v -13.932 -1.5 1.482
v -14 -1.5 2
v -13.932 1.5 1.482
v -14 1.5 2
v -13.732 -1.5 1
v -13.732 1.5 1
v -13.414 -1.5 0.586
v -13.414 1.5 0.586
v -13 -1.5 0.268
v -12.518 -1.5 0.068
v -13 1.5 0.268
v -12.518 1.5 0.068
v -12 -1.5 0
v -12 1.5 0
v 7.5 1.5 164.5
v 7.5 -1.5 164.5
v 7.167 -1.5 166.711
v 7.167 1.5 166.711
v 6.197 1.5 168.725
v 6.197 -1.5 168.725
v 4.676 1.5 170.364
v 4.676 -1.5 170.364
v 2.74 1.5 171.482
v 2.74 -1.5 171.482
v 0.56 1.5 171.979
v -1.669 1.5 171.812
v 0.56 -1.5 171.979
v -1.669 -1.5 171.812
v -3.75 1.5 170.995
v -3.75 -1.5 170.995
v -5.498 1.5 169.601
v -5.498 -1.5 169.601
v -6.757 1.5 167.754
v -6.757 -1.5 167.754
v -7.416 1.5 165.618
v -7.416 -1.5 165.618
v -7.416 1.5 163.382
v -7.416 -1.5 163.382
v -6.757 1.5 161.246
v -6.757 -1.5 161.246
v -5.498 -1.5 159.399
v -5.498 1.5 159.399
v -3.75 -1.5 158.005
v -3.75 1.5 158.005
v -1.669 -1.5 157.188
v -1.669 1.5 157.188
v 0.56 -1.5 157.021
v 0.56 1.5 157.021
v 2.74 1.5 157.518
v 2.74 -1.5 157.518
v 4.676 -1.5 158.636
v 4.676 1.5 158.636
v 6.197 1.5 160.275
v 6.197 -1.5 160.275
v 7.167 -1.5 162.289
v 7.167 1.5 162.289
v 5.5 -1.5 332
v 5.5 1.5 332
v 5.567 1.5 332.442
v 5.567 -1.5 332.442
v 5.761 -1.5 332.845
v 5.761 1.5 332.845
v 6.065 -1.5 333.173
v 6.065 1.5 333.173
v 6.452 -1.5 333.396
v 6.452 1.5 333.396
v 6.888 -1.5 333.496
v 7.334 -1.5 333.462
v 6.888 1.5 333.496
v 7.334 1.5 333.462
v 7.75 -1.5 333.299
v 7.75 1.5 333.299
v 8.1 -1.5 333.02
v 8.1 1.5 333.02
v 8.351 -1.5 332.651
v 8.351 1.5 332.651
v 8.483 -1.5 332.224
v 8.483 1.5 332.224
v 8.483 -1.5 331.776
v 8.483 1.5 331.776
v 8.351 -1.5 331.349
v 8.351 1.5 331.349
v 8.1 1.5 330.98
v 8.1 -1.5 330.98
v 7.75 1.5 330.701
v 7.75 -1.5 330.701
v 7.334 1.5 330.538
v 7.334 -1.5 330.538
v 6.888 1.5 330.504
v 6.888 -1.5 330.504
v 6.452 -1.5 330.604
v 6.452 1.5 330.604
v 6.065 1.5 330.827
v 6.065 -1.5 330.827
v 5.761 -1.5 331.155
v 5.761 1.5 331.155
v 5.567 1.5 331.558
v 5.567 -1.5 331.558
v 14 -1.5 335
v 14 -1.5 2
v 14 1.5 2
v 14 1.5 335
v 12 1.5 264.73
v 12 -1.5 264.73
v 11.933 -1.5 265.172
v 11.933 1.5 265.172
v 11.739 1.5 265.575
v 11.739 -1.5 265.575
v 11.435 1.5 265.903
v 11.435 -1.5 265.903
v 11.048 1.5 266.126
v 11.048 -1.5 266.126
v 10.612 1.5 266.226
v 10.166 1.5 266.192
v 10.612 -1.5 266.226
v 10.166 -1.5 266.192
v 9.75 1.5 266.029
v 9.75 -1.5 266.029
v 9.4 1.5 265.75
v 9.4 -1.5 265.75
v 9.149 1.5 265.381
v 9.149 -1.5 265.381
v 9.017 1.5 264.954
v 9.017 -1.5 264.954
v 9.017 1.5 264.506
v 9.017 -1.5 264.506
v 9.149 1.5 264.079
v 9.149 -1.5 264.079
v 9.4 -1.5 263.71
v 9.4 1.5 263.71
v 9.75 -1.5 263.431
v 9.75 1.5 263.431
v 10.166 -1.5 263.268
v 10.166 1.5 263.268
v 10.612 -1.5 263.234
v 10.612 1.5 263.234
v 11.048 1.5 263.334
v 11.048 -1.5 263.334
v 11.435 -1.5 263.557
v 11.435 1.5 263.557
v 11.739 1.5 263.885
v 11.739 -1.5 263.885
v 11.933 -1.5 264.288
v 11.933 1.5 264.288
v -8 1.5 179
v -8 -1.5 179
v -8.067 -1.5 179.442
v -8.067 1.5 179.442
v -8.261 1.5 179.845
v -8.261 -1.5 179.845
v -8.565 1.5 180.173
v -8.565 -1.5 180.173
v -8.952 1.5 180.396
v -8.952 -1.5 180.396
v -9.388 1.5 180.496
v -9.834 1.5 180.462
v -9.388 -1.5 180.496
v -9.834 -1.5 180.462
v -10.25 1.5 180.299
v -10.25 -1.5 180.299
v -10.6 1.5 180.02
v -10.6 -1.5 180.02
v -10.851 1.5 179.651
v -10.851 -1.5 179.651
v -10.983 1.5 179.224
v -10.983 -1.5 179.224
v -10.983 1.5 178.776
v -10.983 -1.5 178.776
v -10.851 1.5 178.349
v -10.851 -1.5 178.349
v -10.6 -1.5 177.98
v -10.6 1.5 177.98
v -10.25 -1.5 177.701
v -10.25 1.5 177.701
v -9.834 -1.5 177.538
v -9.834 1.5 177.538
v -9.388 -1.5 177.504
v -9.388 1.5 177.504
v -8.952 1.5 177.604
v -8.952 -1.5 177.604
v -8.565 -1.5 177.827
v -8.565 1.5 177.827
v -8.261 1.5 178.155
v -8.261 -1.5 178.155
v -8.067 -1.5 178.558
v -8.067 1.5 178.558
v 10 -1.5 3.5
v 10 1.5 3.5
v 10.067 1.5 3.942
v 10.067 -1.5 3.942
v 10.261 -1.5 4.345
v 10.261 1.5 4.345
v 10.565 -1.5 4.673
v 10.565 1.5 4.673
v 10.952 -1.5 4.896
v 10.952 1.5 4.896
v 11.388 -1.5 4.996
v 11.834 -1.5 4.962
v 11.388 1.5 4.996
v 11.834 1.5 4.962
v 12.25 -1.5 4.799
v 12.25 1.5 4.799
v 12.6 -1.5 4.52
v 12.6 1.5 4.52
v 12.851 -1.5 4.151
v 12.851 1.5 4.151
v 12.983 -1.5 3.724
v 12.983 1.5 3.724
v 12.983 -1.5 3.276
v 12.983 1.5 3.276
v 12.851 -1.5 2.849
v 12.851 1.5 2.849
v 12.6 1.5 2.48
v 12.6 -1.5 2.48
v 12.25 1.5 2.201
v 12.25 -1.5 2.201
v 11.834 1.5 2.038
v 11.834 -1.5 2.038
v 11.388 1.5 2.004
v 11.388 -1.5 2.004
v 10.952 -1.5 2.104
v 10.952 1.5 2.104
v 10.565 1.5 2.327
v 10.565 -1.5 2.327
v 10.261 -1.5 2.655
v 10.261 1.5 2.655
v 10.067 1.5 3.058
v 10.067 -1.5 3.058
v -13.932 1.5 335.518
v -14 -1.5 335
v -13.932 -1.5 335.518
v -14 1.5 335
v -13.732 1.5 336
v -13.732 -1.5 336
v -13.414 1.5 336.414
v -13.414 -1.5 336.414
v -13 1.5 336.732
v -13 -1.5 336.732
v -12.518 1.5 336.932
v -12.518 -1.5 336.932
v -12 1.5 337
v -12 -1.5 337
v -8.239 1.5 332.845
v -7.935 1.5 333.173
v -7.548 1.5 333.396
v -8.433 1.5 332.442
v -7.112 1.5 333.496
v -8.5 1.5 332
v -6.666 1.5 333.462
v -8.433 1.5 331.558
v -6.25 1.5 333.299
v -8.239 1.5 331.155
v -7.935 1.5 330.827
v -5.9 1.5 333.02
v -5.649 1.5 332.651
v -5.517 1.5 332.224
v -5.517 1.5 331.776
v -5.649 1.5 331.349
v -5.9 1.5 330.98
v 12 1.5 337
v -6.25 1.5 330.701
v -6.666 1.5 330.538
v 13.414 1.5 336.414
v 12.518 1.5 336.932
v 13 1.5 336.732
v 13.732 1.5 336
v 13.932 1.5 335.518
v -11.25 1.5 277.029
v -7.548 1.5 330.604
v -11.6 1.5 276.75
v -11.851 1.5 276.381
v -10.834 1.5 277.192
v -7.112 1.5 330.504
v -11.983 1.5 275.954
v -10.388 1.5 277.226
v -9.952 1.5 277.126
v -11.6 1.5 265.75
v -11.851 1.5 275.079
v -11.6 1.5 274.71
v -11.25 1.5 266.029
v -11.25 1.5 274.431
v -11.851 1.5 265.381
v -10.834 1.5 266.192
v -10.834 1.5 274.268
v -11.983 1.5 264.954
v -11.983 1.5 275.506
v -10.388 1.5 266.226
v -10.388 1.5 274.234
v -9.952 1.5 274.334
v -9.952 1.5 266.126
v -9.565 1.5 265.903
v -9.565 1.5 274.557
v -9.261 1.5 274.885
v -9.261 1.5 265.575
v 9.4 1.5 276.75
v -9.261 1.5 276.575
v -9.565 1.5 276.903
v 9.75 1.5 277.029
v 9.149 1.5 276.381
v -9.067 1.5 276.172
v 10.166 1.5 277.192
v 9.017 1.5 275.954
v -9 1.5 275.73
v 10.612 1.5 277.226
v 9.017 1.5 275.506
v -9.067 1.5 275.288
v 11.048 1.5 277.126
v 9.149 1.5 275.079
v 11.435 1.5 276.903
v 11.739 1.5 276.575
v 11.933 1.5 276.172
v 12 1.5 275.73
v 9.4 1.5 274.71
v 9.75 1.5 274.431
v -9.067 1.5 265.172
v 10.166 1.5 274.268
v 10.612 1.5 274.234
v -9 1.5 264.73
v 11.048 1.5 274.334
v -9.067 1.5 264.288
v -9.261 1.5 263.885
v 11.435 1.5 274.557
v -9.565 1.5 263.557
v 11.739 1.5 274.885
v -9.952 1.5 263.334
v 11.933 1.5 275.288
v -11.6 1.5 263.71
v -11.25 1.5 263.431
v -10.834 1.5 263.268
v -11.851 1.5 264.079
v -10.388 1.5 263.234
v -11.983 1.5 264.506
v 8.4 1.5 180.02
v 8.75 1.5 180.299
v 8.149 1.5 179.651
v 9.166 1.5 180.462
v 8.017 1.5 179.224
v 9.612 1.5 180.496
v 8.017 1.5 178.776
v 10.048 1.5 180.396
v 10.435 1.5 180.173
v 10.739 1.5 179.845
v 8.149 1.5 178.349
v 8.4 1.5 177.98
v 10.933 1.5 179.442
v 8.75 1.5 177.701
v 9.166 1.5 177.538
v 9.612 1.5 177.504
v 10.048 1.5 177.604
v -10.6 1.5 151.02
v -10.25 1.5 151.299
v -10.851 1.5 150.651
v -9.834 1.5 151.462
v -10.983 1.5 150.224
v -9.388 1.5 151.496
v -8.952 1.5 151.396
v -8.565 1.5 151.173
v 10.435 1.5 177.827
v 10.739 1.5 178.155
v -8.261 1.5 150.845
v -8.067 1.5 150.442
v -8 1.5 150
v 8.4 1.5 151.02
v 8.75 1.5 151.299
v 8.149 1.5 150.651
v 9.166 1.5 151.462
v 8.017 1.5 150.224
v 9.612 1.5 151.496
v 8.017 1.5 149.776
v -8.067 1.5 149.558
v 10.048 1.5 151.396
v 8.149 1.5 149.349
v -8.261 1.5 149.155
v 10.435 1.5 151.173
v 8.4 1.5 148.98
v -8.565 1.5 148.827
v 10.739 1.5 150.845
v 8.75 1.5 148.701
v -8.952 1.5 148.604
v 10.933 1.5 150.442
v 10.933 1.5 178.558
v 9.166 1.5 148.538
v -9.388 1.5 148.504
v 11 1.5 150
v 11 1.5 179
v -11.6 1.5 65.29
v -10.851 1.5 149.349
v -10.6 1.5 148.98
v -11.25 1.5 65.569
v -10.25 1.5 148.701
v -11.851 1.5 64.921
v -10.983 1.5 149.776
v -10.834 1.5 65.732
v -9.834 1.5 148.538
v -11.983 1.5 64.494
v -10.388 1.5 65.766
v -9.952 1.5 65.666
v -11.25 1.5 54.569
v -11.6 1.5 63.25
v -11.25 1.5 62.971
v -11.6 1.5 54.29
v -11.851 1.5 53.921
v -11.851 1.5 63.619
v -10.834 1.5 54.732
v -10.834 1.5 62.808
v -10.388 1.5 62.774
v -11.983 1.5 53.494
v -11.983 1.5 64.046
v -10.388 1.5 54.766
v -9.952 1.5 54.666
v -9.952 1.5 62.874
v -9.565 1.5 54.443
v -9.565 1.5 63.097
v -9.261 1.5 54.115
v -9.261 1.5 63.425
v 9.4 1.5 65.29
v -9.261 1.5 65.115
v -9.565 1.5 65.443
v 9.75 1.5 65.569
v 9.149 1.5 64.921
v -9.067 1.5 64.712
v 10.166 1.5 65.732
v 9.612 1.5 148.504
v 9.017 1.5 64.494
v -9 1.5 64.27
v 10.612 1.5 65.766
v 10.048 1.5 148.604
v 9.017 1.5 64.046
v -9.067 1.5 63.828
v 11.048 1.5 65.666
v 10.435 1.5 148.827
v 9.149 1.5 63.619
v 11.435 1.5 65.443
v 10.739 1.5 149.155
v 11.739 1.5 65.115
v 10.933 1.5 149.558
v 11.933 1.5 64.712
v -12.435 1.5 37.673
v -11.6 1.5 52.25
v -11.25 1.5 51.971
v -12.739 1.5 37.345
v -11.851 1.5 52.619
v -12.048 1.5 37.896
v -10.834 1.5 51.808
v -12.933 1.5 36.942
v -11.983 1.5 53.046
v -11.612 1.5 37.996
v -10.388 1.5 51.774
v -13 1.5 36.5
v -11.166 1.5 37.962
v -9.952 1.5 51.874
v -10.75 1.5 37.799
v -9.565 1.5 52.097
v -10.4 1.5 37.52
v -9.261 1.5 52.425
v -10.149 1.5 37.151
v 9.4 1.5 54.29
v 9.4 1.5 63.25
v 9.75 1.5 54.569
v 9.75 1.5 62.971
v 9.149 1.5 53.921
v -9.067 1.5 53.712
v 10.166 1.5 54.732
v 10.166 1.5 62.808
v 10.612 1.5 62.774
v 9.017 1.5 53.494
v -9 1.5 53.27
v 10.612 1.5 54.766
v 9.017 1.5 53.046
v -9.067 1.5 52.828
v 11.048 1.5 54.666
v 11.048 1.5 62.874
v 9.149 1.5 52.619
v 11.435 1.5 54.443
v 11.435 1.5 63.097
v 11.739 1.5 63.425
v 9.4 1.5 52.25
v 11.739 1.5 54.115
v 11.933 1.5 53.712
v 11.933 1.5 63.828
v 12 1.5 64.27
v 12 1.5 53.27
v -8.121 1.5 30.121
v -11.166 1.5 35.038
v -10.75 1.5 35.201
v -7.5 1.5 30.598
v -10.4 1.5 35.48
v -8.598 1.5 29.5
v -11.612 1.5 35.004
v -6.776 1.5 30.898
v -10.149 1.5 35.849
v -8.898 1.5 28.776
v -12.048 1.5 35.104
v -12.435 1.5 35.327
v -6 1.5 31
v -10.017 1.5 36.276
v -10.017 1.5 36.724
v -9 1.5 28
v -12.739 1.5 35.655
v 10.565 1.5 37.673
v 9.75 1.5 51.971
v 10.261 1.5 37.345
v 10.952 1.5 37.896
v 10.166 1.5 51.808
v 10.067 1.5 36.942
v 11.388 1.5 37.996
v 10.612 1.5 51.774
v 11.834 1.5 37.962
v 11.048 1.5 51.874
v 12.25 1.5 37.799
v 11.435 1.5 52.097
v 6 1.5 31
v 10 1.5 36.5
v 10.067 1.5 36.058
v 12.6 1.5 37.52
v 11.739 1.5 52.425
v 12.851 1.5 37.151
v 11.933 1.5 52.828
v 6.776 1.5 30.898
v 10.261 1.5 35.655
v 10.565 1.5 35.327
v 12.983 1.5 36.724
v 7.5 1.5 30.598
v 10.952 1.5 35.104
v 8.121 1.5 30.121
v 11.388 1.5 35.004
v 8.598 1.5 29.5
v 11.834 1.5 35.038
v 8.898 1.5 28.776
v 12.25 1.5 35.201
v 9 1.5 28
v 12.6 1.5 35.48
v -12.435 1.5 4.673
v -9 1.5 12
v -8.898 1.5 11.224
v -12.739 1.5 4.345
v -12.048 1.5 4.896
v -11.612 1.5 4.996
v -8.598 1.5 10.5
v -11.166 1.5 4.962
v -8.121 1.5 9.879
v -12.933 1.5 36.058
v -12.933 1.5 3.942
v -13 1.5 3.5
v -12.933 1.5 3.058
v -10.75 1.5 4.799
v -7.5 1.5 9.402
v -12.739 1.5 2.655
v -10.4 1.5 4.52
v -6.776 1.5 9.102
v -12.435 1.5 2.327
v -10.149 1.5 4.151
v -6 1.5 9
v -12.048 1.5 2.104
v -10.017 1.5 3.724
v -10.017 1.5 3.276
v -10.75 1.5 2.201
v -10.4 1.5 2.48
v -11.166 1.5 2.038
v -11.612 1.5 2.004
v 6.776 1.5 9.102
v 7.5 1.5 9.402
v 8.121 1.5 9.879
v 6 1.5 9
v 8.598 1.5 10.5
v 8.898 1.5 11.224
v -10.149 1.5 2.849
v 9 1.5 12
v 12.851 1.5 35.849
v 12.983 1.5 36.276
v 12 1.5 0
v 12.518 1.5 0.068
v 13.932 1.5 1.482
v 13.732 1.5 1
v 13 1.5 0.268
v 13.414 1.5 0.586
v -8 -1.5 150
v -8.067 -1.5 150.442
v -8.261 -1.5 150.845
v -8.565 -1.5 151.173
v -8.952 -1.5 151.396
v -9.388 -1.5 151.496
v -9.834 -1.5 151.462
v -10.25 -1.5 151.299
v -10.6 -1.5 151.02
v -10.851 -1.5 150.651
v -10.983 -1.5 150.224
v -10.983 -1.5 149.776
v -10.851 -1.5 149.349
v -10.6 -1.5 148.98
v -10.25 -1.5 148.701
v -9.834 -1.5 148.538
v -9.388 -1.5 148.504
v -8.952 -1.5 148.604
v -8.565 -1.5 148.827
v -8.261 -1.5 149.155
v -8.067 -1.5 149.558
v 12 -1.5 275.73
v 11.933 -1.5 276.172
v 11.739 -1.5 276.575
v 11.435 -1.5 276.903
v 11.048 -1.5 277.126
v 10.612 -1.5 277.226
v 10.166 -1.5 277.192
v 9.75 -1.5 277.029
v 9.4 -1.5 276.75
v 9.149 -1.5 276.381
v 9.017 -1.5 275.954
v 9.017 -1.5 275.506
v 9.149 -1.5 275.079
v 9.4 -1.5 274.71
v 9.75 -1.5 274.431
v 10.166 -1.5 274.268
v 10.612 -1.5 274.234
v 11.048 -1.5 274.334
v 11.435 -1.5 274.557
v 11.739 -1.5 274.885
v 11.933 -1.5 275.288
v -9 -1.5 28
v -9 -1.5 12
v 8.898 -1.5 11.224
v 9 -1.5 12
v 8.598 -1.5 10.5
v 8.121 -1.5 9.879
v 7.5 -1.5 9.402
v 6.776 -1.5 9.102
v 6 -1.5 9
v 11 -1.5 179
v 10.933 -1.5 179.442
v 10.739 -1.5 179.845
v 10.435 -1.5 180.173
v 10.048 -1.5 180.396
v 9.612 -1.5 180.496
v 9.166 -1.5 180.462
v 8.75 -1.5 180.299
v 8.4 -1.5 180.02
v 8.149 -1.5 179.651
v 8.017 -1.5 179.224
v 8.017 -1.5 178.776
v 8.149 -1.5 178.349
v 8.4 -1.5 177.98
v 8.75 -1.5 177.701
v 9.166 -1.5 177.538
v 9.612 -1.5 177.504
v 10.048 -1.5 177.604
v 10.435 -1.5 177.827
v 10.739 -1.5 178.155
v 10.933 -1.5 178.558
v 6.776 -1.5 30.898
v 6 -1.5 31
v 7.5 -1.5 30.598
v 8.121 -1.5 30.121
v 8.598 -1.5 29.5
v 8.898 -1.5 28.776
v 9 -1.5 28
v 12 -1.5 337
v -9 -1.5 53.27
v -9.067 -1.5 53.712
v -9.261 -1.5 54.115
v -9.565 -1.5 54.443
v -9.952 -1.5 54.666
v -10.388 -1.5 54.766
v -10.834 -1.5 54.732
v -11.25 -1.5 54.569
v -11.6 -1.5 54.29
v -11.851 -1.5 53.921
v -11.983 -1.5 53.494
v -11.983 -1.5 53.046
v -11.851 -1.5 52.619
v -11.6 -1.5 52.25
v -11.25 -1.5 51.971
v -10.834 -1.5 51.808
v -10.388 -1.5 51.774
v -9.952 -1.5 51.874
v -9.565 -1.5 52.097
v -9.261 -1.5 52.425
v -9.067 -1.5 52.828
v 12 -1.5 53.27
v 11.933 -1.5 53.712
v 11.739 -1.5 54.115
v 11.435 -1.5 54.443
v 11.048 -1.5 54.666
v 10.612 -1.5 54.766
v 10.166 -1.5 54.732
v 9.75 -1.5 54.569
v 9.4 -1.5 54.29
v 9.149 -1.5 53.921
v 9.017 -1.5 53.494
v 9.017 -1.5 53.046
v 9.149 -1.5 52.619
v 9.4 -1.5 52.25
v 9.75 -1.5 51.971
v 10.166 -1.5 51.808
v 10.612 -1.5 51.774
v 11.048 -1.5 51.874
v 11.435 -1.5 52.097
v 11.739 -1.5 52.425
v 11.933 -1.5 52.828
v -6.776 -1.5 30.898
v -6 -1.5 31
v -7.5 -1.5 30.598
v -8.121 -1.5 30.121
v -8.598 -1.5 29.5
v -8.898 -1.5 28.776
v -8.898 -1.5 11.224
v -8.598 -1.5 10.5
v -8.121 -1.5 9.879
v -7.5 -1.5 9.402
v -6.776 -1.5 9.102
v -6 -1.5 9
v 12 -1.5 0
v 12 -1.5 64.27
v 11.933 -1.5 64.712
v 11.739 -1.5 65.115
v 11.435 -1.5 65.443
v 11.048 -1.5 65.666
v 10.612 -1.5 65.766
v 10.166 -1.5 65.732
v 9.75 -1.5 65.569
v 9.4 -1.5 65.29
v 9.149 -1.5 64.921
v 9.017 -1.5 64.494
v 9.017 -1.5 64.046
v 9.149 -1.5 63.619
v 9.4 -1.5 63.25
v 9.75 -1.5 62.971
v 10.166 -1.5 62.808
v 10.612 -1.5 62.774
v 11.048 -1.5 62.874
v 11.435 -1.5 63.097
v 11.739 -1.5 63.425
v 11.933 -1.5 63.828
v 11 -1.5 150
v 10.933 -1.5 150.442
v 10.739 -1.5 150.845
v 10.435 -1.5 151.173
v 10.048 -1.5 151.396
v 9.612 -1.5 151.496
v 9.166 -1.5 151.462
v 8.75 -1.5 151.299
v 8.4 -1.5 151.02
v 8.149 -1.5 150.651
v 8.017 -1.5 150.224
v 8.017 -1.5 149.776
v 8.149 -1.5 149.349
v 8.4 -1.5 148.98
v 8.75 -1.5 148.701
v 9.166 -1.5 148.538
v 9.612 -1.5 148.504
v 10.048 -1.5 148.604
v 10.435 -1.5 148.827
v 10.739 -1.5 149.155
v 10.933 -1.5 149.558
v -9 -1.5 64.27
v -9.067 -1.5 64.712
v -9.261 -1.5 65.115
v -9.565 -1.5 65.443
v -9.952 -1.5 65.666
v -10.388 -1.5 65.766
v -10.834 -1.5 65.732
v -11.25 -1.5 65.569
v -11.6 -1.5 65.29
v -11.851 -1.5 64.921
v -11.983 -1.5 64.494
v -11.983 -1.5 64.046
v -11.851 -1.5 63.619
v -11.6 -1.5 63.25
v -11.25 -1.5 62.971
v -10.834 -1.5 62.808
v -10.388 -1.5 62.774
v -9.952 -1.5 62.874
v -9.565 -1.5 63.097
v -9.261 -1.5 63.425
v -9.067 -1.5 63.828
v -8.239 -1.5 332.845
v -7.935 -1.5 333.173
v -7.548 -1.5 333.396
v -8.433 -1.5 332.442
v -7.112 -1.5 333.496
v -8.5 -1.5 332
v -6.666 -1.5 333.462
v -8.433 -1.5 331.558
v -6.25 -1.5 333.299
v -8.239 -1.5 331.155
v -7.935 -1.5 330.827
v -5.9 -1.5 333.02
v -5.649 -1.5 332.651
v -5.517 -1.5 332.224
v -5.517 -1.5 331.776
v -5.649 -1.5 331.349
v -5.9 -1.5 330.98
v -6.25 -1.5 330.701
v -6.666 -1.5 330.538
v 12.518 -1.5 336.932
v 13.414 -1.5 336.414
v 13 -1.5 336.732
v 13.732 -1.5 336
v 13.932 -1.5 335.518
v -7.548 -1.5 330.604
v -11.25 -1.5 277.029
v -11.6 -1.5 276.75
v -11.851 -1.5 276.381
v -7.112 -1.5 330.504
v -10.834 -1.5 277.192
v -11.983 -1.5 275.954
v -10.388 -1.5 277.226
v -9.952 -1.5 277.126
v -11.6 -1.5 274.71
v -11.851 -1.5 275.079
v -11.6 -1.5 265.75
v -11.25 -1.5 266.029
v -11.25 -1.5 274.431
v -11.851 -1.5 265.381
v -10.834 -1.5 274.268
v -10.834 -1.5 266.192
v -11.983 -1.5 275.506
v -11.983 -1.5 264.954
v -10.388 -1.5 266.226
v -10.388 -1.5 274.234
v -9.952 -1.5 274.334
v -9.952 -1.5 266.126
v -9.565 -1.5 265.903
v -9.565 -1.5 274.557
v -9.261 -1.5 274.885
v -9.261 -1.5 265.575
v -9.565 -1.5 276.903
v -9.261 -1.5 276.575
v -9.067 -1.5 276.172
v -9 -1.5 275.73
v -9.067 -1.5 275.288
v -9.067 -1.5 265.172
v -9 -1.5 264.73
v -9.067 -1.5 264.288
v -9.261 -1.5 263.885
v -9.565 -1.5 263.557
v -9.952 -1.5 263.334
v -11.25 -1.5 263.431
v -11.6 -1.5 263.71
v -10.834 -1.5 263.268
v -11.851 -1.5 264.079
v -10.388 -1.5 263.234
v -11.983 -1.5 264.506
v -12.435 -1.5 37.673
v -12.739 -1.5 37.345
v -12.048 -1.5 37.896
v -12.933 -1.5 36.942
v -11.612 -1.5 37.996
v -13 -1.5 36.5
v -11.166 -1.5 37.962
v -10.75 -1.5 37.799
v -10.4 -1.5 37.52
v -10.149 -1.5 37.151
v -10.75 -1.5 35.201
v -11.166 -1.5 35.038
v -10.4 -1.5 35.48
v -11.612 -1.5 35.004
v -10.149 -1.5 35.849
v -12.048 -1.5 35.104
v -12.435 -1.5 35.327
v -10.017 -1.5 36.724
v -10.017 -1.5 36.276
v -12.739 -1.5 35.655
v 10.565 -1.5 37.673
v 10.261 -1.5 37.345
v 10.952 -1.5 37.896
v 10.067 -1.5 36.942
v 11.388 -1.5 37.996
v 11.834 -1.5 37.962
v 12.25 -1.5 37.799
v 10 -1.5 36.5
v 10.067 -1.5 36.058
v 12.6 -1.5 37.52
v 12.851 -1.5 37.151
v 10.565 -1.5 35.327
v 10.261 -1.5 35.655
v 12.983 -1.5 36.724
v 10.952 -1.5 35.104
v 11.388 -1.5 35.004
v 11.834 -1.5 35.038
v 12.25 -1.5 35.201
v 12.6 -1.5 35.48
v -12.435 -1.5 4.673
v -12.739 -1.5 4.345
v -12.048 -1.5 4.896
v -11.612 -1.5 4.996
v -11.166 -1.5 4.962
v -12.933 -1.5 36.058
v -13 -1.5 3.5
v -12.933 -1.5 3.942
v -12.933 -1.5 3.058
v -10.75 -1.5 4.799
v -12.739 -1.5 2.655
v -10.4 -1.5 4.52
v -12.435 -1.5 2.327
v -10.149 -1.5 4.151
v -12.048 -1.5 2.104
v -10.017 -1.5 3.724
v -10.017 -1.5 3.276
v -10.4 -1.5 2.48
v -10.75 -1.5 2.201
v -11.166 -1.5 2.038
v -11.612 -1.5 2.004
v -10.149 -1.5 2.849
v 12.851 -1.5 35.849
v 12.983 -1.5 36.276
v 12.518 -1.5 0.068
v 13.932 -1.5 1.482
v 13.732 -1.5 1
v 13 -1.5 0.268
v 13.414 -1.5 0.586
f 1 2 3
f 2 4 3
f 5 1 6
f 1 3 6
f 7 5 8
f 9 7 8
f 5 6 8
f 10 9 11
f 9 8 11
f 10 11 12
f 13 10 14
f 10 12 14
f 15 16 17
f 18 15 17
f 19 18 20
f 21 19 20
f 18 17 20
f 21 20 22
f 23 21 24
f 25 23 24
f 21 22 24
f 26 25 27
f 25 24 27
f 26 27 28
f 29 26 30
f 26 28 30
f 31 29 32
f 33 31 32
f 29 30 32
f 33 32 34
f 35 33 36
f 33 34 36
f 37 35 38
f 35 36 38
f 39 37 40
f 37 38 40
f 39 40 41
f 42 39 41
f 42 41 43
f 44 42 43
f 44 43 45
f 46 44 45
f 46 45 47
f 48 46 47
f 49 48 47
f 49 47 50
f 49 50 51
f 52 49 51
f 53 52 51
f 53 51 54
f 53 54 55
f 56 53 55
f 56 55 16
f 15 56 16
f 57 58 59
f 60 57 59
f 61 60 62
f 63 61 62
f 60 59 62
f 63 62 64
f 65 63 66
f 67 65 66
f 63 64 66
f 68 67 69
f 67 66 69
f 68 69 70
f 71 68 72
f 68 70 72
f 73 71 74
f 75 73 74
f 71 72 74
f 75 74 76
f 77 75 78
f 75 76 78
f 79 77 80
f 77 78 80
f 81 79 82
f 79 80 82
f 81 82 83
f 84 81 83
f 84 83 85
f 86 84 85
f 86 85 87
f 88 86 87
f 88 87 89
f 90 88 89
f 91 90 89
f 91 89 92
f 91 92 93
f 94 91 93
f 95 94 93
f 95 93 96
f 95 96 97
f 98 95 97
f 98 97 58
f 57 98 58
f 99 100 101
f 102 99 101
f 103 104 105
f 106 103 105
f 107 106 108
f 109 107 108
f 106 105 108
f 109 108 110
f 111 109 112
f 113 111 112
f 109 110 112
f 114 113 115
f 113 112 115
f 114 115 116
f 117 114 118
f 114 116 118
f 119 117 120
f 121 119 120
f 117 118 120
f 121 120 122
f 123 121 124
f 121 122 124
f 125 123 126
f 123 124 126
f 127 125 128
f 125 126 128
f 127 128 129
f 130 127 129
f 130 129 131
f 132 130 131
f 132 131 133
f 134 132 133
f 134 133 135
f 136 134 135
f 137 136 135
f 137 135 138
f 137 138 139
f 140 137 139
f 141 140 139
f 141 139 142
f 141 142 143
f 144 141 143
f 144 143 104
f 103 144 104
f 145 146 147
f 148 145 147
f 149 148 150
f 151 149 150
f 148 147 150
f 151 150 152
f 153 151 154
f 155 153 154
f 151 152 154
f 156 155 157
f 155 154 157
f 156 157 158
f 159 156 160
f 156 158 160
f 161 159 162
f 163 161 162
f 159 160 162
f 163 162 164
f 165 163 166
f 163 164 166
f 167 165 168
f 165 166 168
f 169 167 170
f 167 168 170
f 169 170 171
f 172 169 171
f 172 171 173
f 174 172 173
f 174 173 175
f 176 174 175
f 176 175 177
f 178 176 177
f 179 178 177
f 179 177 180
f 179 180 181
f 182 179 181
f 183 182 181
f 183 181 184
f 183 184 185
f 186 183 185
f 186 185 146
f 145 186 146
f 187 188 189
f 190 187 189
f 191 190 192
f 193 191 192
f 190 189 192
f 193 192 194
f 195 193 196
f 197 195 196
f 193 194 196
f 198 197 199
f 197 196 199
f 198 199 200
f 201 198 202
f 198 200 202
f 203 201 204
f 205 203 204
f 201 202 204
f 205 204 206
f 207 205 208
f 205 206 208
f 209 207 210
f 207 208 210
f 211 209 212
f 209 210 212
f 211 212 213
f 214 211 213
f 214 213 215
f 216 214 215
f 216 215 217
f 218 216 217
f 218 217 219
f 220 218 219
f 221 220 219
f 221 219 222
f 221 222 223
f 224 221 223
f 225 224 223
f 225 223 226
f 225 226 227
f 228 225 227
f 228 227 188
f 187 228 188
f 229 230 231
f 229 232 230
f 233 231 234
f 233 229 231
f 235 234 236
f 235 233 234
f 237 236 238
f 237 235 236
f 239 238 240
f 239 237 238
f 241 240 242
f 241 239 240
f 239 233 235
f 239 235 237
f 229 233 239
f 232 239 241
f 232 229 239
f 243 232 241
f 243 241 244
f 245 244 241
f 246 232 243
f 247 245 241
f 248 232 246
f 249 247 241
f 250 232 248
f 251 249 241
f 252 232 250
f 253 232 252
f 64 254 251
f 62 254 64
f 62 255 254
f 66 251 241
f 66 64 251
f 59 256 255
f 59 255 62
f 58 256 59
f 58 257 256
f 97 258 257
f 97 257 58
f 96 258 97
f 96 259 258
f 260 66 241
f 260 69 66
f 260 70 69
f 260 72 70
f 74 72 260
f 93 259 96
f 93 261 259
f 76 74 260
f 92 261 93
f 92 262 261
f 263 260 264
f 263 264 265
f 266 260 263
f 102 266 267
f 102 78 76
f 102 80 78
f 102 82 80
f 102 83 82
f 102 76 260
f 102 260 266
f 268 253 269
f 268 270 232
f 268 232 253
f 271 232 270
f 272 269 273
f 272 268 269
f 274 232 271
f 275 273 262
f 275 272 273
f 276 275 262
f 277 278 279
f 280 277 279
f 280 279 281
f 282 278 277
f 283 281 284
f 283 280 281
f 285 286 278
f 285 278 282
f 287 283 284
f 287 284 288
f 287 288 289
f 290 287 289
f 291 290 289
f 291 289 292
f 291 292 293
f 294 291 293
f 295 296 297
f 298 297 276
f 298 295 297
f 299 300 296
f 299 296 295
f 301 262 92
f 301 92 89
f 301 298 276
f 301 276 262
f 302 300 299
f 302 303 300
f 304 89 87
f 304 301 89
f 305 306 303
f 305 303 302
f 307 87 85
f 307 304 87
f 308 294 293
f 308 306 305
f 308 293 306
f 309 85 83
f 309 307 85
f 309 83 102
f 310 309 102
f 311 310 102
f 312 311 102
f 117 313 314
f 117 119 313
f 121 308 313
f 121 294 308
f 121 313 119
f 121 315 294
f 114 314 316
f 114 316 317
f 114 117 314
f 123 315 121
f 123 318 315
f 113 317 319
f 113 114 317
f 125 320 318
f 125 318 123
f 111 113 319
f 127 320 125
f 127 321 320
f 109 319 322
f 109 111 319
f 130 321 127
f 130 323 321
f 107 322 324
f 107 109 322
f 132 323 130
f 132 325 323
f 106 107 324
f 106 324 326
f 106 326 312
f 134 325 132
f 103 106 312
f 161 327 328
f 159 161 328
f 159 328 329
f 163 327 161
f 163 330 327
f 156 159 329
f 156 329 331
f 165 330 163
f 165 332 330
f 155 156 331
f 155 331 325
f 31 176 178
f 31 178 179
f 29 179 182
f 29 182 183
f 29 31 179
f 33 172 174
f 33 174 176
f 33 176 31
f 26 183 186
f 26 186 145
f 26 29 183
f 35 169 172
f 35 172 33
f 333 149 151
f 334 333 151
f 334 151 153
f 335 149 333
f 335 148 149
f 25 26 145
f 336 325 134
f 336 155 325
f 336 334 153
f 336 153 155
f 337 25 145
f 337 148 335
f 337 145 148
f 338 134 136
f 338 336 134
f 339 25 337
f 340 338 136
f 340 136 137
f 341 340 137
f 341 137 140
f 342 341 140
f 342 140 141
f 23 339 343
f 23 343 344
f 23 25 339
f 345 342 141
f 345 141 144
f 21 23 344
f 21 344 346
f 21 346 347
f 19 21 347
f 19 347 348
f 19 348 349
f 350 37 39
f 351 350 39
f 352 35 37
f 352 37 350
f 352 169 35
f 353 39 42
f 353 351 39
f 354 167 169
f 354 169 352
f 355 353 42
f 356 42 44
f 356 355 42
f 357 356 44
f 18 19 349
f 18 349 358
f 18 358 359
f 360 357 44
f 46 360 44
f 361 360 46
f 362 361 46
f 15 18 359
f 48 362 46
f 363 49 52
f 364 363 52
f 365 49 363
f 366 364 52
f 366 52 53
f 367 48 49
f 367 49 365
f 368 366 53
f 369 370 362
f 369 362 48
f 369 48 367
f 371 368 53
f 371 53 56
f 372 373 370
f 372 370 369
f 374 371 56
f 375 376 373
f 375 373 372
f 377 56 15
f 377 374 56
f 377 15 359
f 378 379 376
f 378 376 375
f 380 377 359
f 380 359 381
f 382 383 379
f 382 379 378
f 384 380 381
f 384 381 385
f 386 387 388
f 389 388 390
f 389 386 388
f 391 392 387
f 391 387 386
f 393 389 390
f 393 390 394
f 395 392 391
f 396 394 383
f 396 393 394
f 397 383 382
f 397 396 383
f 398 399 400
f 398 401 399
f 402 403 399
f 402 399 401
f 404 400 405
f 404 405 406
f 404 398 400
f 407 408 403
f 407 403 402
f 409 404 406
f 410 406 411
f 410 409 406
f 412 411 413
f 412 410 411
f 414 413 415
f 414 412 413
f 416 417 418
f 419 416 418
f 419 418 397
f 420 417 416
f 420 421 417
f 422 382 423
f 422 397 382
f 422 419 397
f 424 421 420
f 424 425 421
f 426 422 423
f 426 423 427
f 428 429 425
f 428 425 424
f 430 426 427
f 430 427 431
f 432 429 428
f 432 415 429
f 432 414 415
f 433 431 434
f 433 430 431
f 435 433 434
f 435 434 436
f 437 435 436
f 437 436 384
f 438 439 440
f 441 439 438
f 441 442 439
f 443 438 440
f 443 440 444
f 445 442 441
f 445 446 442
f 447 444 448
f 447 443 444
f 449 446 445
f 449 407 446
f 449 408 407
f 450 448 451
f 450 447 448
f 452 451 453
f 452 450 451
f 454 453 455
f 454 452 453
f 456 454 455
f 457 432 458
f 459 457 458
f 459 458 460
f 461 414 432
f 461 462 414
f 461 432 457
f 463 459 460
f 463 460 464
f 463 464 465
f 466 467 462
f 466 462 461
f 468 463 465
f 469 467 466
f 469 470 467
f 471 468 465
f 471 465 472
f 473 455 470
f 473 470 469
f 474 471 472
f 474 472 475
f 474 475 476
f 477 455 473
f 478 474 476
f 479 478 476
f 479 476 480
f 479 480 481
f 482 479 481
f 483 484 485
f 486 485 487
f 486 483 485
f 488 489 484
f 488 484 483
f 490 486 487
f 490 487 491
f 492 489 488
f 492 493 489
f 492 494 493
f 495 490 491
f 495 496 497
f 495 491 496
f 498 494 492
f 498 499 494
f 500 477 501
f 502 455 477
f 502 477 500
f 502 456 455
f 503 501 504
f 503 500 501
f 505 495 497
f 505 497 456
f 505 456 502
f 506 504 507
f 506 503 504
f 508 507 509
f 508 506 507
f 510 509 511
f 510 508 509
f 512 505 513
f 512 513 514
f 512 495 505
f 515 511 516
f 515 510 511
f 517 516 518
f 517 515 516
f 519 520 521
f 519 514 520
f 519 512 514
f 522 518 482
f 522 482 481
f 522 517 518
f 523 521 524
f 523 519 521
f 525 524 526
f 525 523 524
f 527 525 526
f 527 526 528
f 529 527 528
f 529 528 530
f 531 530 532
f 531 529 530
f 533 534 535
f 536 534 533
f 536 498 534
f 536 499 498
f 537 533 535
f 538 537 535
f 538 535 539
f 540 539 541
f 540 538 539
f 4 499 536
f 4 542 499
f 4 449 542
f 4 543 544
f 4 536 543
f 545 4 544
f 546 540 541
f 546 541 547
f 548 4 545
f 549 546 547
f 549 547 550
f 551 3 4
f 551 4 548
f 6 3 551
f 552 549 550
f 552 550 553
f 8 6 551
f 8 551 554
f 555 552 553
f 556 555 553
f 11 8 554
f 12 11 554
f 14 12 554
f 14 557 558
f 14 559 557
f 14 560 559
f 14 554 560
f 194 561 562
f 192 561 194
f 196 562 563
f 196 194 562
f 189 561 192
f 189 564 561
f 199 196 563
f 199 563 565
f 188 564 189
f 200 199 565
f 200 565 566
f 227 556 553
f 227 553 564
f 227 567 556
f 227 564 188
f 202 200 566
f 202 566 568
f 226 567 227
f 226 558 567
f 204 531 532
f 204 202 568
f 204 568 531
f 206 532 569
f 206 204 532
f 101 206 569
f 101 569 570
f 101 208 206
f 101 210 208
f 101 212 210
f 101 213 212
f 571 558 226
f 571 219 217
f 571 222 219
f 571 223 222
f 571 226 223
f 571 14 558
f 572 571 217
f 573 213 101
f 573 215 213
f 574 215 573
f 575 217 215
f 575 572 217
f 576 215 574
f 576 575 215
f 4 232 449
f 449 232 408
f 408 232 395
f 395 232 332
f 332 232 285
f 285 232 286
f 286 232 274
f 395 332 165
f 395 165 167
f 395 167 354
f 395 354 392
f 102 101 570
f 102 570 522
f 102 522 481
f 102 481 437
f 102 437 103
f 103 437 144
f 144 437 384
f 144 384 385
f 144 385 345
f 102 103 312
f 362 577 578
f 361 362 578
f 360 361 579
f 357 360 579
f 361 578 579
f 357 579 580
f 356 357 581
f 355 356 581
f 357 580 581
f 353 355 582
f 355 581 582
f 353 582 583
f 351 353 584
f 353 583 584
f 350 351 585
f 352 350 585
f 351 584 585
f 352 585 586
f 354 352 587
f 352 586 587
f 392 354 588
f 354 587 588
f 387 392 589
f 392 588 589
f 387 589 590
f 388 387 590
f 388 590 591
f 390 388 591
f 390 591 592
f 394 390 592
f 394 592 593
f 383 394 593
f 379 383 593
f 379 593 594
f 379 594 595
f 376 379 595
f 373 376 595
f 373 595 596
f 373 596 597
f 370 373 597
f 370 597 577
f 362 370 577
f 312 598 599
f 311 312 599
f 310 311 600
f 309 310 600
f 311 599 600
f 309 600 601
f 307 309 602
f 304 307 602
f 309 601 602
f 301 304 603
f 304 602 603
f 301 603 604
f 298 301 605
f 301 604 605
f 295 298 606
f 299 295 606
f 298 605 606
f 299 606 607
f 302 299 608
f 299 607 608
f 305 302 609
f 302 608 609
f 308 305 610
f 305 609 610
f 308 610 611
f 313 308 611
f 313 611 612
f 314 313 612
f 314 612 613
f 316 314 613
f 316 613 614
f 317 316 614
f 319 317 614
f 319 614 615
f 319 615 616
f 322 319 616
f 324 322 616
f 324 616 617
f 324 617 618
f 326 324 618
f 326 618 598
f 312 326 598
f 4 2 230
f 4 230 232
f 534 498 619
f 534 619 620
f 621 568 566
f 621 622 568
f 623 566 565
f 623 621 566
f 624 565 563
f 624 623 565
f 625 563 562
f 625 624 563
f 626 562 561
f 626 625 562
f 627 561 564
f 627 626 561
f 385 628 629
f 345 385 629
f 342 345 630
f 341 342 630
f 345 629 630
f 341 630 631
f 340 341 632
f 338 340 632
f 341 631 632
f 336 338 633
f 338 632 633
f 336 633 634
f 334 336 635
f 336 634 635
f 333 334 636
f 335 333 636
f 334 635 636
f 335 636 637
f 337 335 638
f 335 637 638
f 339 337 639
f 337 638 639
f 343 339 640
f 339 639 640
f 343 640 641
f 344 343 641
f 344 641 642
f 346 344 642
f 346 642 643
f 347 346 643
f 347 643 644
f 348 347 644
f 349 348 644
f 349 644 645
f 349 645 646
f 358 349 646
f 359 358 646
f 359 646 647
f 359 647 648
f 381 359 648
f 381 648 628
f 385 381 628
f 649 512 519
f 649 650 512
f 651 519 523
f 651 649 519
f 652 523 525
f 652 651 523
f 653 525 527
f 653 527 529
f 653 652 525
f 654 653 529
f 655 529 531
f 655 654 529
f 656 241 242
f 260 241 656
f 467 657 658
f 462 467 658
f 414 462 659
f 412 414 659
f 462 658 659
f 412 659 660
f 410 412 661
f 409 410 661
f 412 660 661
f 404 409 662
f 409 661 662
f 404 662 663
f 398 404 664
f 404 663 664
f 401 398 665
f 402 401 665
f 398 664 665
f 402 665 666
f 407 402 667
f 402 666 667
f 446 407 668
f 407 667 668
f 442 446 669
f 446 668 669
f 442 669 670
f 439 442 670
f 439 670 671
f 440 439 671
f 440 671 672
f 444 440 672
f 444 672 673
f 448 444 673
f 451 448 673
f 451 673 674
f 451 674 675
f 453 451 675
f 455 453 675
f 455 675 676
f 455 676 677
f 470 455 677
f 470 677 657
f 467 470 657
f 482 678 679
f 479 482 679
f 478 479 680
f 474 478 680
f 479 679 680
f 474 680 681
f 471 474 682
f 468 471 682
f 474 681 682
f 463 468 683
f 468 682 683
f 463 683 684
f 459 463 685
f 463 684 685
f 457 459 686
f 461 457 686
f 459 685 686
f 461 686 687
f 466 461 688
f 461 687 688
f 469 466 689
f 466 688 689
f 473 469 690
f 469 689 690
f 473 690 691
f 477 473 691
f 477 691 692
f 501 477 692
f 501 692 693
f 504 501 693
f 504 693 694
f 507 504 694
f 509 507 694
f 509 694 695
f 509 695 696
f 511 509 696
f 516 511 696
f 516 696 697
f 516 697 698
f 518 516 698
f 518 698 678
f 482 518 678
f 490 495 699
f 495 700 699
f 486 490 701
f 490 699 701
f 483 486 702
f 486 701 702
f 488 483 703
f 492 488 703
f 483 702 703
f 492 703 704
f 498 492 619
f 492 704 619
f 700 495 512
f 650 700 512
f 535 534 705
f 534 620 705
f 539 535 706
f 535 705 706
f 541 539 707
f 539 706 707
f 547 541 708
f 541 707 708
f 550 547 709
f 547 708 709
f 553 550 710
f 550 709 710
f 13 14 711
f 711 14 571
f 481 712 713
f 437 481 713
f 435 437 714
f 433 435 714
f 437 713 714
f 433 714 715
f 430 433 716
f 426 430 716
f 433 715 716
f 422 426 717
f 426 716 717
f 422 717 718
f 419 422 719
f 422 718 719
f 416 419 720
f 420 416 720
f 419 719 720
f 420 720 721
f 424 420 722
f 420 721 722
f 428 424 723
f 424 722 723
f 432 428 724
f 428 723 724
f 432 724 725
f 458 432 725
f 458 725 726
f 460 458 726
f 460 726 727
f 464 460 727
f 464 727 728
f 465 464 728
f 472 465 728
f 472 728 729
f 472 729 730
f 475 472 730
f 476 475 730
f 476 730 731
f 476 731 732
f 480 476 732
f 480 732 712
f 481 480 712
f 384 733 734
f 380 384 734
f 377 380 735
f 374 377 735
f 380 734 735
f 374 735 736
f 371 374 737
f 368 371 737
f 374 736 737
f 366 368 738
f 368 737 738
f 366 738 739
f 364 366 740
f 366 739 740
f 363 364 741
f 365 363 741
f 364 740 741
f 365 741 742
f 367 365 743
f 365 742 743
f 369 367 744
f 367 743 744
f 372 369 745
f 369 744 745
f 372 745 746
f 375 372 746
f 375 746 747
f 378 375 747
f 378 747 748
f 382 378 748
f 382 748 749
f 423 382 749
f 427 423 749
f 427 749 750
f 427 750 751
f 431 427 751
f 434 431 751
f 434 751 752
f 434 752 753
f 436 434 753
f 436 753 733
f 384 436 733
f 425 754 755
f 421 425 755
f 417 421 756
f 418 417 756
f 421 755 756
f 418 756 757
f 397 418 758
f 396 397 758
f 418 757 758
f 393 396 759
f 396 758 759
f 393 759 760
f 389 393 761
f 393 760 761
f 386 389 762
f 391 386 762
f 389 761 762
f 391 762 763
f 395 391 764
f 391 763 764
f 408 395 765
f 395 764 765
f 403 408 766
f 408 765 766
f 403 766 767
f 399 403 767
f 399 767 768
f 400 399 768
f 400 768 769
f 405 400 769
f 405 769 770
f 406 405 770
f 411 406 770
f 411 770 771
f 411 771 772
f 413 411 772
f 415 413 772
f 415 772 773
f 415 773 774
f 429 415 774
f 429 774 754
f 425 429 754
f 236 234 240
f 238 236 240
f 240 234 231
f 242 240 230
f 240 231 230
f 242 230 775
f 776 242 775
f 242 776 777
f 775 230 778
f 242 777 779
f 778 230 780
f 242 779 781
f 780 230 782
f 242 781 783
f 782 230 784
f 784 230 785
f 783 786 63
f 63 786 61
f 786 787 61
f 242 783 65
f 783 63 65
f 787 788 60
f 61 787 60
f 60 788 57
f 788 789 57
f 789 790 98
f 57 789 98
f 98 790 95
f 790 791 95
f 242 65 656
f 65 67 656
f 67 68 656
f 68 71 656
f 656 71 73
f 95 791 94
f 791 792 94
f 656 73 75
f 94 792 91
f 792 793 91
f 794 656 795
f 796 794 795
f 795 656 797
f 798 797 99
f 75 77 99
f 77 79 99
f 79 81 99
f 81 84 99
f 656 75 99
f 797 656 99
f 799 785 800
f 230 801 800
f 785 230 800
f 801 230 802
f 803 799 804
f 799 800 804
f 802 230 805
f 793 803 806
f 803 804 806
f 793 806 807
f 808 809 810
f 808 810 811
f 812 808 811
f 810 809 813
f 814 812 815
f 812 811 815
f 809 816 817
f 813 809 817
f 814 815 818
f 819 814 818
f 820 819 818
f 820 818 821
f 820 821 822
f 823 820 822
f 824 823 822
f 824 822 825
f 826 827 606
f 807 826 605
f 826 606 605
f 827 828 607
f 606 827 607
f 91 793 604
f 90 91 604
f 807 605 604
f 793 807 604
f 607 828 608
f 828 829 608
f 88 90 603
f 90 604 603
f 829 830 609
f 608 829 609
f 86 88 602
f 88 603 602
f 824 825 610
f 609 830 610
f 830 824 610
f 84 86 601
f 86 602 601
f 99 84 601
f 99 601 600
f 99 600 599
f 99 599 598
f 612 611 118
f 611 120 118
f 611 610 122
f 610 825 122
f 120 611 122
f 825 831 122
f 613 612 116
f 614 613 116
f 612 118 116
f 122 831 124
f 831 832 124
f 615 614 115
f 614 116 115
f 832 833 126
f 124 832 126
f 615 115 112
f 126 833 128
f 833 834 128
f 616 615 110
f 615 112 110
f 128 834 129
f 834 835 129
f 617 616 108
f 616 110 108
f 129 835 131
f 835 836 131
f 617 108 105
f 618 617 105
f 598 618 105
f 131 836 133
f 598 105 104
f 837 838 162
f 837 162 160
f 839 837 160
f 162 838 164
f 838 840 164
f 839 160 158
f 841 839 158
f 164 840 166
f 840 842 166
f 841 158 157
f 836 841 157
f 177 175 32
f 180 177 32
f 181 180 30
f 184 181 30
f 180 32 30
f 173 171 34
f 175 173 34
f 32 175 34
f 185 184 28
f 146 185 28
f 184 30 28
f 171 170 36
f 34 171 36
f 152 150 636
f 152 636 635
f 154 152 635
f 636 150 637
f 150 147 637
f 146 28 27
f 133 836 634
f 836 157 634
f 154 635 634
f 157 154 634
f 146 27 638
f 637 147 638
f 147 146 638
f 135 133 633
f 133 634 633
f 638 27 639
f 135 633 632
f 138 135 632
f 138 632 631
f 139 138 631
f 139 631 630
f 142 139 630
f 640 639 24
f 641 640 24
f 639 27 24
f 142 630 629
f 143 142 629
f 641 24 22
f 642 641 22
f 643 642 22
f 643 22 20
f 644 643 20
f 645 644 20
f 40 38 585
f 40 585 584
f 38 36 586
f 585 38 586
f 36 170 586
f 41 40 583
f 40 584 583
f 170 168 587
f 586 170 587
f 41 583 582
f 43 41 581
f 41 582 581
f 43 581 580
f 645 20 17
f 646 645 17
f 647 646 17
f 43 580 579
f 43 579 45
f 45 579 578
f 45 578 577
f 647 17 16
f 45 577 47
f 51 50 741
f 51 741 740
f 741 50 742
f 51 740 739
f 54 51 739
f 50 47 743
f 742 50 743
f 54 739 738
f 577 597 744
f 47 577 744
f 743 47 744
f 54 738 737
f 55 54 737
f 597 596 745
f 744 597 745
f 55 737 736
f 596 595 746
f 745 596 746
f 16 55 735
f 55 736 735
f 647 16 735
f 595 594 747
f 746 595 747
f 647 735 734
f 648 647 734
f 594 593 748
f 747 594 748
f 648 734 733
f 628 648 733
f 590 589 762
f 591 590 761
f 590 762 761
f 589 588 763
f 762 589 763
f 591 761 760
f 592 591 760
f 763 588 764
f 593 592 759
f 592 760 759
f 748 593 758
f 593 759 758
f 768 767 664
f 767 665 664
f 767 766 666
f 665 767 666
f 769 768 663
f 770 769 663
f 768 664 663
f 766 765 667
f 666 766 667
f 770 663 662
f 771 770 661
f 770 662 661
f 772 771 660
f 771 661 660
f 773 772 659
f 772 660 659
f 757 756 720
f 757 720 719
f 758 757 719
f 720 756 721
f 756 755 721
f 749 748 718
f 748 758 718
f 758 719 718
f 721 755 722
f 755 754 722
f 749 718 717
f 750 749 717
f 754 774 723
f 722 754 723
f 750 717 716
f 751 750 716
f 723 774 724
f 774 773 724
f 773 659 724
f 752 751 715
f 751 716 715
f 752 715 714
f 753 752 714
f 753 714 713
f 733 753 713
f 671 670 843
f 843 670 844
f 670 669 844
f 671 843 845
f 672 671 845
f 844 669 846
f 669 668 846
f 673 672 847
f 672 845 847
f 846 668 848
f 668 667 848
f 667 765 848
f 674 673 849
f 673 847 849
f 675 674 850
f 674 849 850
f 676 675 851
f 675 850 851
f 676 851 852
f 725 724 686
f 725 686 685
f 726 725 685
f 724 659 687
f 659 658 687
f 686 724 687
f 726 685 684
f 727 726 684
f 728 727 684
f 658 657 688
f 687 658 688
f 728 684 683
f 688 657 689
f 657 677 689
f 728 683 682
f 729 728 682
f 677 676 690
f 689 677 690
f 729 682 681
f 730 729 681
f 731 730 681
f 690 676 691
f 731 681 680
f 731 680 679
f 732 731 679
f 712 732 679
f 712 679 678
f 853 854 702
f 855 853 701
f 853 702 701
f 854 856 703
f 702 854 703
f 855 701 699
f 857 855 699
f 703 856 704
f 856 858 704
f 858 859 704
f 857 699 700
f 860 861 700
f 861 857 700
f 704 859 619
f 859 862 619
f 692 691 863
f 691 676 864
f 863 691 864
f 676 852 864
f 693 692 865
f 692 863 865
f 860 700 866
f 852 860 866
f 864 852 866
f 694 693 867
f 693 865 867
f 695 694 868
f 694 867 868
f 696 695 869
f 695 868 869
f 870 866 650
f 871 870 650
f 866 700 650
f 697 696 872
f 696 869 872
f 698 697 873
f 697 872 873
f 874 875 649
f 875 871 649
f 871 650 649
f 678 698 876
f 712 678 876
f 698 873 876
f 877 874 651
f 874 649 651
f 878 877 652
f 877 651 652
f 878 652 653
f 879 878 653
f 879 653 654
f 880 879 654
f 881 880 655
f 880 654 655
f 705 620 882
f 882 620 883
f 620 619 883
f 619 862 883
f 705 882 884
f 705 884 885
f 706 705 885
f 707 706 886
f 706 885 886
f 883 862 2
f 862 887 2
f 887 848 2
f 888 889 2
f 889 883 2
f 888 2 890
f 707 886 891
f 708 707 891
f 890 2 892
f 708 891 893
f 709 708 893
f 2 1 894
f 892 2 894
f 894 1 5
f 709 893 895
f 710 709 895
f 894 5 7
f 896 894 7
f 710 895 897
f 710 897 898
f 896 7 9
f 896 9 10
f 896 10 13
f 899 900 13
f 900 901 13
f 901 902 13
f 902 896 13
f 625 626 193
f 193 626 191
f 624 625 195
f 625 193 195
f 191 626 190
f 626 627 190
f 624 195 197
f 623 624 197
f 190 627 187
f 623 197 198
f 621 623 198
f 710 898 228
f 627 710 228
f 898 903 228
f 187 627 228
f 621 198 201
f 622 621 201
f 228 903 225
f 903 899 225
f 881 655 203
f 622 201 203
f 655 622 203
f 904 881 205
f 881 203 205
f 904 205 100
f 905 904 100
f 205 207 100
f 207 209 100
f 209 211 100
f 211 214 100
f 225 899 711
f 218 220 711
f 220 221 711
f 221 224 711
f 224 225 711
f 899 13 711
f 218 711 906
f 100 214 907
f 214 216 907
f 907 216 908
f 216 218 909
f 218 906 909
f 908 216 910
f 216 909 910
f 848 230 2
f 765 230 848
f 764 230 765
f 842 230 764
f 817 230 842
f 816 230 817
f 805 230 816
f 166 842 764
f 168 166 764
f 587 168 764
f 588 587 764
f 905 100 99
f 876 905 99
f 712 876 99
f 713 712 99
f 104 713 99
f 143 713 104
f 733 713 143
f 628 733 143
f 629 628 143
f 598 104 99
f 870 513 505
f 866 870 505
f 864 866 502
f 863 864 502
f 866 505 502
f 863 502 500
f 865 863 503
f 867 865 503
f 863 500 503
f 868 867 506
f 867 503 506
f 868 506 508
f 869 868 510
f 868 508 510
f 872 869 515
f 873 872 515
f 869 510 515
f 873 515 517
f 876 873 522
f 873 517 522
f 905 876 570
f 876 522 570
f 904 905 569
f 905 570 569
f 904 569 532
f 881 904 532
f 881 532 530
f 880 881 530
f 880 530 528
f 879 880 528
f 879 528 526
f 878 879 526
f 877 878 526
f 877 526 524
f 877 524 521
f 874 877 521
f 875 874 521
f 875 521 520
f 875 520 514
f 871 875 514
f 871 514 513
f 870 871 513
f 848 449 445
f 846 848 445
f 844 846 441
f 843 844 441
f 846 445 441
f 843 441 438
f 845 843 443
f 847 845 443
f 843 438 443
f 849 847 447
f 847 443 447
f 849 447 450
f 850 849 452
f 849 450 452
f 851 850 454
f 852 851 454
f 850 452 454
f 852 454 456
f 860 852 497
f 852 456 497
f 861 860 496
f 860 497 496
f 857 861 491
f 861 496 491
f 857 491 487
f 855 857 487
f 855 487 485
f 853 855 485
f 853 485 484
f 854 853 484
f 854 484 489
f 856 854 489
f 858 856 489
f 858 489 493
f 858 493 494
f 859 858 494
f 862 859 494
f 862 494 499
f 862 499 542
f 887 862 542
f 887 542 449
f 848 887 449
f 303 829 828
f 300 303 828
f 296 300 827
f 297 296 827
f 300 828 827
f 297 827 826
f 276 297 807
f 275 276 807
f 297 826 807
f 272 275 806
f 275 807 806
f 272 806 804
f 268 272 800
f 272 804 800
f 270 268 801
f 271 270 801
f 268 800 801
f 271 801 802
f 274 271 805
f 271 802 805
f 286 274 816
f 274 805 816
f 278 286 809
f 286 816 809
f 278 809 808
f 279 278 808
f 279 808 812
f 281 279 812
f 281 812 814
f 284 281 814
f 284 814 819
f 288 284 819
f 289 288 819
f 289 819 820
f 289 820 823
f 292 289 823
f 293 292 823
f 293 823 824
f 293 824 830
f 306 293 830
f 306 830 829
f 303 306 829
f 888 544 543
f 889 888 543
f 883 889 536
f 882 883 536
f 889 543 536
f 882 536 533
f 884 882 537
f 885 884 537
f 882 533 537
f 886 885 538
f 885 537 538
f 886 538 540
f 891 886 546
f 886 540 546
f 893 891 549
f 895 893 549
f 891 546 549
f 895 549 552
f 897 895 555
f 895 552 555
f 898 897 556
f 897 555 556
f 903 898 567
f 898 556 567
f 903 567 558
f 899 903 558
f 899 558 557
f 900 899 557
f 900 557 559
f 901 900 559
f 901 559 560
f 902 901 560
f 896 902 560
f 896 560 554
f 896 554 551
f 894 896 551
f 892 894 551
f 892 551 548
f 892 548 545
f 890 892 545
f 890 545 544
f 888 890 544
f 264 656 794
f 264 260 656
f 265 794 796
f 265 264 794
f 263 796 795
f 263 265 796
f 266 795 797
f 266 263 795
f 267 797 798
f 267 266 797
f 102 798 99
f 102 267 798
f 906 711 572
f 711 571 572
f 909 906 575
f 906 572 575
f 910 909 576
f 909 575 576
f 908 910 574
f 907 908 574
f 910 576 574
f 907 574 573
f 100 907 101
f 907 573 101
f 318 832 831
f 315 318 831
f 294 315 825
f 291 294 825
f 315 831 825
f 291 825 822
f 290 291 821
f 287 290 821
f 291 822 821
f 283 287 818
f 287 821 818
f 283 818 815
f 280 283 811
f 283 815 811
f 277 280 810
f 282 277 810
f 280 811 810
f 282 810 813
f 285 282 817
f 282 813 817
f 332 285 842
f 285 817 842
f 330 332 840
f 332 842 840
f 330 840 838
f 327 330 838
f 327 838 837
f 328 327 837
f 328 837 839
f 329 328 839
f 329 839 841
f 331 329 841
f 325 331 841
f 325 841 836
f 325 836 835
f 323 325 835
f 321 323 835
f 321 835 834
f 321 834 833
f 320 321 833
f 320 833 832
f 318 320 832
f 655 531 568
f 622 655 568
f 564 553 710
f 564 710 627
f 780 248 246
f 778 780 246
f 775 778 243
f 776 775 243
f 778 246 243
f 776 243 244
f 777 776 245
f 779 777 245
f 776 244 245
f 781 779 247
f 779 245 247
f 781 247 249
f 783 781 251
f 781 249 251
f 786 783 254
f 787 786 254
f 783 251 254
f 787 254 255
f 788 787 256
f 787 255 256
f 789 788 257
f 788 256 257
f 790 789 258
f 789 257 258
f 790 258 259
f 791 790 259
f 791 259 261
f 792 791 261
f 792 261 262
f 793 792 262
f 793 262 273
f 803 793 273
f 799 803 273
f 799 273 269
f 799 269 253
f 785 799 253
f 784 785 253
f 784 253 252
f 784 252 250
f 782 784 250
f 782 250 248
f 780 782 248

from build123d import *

# Parameters (mm, degrees)
SKETCH_1_W             = 28
SKETCH_1_H             = 3
EXTRUDE_1_DEPTH        = 337
SKETCH_2_R             = 7.5
SKETCH_2_R_2           = 1.5
CUT_EXTRUDE_1_DEPTH    = 400
SKETCH_3_R             = 1.5
SKETCH_3_W             = 18
SKETCH_3_H             = 22
CUT_EXTRUDE_2_DEPTH    = 10
SKETCH_4_R             = 1.5
CUT_EXTRUDE_3_DEPTH    = 10
SKETCH_5_R             = 1.5
CUT_EXTRUDE_4_DEPTH    = 10
FILLET_1_R             = 2
FILLET_3_R             = 3
PATTERN_LINEAR_1_COUNT = 2
PATTERN_LINEAR_1_PITCH = 211.46


with BuildPart() as part:
    # 草图1 → 凸台-拉伸1 (new body)
    with BuildSketch(Plane.XY):
        Rectangle(SKETCH_1_W, SKETCH_1_H)
    extrude(amount=EXTRUDE_1_DEPTH)

    # 草图2 → 切除-拉伸1 (cut)
    with BuildSketch(Plane.XZ.offset(1.5)):
        with Locations((0, 164.5)):
            Circle(SKETCH_2_R)
        with Locations((-9.5, 179)):
            Circle(SKETCH_2_R_2)
        with Locations((9.5, 179)):
            Circle(SKETCH_2_R_2)
        with Locations((9.5, 150)):
            Circle(SKETCH_2_R_2)
        with Locations((-9.5, 150)):
            Circle(SKETCH_2_R_2)
    extrude(amount=-CUT_EXTRUDE_1_DEPTH, mode=Mode.SUBTRACT)

    # 草图3 → 切除-拉伸2 (cut)
    with BuildSketch(Plane(origin=(0, 1.5, 0), x_dir=(1, 0, 0), z_dir=(0, 1, 0))):
        with Locations(Location((11.5, -3.5, 0), (0, 0, 180))):
            Circle(SKETCH_3_R)
        with Locations(Location((-11.5, -3.5, 0), (0, 0, 180))):
            Circle(SKETCH_3_R)
        with Locations(Location((-11.5, -36.5, 0), (0, 0, 180))):
            Circle(SKETCH_3_R)
        with Locations(Location((11.5, -36.5, 0), (0, 0, 180))):
            Circle(SKETCH_3_R)
        with Locations((0, -20)):
            Rectangle(SKETCH_3_W, SKETCH_3_H)
    extrude(amount=-CUT_EXTRUDE_2_DEPTH, mode=Mode.SUBTRACT)

    # 草图4 → 切除-拉伸3 (cut)
    with BuildSketch(Plane(origin=(0, 1.5, 0), x_dir=(1, 0, 0), z_dir=(0, 1, 0))):
        with Locations(Location((7, -332, 0), (0, 0, 180))):
            Circle(SKETCH_4_R)
        with Locations(Location((-7, -332, 0), (0, 0, 180))):
            Circle(SKETCH_4_R)
    extrude(amount=-CUT_EXTRUDE_3_DEPTH, mode=Mode.SUBTRACT)

    # 草图5 → 切除-拉伸4 (cut)
    with BuildSketch(Plane.XZ.offset(1.5)):
        with Locations((-10.5, 264.73)):
            Circle(SKETCH_5_R)
        with Locations((-10.5, 275.73)):
            Circle(SKETCH_5_R)
        with Locations((10.5, 275.73)):
            Circle(SKETCH_5_R)
        with Locations((10.5, 264.73)):
            Circle(SKETCH_5_R)
    cut_extrude_4 = extrude(amount=-CUT_EXTRUDE_4_DEPTH, mode=Mode.SUBTRACT)

    # 圆角1
    fillet_1_edges = [part.edges().sort_by_distance(p)[0] for p in [
        (-14, 0, 337),
        (14, 0, 337),
        (-14, 0, 0),
        (14, 0, 0),
    ]]
    fillet(fillet_1_edges, radius=FILLET_1_R)

    # 圆角3
    fillet_3_edges = [part.edges().sort_by_distance(p)[0] for p in [
        (9, 0, 9),
        (9, 0, 31),
        (-9, 0, 31),
        (-9, 0, 9),
    ]]
    fillet(fillet_3_edges, radius=FILLET_3_R)

    # 阵列(线性)1: 切除-拉伸4 ×2
    with Locations(*[(0, 0, -i * PATTERN_LINEAR_1_PITCH) for i in range(1, PATTERN_LINEAR_1_COUNT)]):
        add(cut_extrude_4, mode=Mode.SUBTRACT)


solid = part.part
